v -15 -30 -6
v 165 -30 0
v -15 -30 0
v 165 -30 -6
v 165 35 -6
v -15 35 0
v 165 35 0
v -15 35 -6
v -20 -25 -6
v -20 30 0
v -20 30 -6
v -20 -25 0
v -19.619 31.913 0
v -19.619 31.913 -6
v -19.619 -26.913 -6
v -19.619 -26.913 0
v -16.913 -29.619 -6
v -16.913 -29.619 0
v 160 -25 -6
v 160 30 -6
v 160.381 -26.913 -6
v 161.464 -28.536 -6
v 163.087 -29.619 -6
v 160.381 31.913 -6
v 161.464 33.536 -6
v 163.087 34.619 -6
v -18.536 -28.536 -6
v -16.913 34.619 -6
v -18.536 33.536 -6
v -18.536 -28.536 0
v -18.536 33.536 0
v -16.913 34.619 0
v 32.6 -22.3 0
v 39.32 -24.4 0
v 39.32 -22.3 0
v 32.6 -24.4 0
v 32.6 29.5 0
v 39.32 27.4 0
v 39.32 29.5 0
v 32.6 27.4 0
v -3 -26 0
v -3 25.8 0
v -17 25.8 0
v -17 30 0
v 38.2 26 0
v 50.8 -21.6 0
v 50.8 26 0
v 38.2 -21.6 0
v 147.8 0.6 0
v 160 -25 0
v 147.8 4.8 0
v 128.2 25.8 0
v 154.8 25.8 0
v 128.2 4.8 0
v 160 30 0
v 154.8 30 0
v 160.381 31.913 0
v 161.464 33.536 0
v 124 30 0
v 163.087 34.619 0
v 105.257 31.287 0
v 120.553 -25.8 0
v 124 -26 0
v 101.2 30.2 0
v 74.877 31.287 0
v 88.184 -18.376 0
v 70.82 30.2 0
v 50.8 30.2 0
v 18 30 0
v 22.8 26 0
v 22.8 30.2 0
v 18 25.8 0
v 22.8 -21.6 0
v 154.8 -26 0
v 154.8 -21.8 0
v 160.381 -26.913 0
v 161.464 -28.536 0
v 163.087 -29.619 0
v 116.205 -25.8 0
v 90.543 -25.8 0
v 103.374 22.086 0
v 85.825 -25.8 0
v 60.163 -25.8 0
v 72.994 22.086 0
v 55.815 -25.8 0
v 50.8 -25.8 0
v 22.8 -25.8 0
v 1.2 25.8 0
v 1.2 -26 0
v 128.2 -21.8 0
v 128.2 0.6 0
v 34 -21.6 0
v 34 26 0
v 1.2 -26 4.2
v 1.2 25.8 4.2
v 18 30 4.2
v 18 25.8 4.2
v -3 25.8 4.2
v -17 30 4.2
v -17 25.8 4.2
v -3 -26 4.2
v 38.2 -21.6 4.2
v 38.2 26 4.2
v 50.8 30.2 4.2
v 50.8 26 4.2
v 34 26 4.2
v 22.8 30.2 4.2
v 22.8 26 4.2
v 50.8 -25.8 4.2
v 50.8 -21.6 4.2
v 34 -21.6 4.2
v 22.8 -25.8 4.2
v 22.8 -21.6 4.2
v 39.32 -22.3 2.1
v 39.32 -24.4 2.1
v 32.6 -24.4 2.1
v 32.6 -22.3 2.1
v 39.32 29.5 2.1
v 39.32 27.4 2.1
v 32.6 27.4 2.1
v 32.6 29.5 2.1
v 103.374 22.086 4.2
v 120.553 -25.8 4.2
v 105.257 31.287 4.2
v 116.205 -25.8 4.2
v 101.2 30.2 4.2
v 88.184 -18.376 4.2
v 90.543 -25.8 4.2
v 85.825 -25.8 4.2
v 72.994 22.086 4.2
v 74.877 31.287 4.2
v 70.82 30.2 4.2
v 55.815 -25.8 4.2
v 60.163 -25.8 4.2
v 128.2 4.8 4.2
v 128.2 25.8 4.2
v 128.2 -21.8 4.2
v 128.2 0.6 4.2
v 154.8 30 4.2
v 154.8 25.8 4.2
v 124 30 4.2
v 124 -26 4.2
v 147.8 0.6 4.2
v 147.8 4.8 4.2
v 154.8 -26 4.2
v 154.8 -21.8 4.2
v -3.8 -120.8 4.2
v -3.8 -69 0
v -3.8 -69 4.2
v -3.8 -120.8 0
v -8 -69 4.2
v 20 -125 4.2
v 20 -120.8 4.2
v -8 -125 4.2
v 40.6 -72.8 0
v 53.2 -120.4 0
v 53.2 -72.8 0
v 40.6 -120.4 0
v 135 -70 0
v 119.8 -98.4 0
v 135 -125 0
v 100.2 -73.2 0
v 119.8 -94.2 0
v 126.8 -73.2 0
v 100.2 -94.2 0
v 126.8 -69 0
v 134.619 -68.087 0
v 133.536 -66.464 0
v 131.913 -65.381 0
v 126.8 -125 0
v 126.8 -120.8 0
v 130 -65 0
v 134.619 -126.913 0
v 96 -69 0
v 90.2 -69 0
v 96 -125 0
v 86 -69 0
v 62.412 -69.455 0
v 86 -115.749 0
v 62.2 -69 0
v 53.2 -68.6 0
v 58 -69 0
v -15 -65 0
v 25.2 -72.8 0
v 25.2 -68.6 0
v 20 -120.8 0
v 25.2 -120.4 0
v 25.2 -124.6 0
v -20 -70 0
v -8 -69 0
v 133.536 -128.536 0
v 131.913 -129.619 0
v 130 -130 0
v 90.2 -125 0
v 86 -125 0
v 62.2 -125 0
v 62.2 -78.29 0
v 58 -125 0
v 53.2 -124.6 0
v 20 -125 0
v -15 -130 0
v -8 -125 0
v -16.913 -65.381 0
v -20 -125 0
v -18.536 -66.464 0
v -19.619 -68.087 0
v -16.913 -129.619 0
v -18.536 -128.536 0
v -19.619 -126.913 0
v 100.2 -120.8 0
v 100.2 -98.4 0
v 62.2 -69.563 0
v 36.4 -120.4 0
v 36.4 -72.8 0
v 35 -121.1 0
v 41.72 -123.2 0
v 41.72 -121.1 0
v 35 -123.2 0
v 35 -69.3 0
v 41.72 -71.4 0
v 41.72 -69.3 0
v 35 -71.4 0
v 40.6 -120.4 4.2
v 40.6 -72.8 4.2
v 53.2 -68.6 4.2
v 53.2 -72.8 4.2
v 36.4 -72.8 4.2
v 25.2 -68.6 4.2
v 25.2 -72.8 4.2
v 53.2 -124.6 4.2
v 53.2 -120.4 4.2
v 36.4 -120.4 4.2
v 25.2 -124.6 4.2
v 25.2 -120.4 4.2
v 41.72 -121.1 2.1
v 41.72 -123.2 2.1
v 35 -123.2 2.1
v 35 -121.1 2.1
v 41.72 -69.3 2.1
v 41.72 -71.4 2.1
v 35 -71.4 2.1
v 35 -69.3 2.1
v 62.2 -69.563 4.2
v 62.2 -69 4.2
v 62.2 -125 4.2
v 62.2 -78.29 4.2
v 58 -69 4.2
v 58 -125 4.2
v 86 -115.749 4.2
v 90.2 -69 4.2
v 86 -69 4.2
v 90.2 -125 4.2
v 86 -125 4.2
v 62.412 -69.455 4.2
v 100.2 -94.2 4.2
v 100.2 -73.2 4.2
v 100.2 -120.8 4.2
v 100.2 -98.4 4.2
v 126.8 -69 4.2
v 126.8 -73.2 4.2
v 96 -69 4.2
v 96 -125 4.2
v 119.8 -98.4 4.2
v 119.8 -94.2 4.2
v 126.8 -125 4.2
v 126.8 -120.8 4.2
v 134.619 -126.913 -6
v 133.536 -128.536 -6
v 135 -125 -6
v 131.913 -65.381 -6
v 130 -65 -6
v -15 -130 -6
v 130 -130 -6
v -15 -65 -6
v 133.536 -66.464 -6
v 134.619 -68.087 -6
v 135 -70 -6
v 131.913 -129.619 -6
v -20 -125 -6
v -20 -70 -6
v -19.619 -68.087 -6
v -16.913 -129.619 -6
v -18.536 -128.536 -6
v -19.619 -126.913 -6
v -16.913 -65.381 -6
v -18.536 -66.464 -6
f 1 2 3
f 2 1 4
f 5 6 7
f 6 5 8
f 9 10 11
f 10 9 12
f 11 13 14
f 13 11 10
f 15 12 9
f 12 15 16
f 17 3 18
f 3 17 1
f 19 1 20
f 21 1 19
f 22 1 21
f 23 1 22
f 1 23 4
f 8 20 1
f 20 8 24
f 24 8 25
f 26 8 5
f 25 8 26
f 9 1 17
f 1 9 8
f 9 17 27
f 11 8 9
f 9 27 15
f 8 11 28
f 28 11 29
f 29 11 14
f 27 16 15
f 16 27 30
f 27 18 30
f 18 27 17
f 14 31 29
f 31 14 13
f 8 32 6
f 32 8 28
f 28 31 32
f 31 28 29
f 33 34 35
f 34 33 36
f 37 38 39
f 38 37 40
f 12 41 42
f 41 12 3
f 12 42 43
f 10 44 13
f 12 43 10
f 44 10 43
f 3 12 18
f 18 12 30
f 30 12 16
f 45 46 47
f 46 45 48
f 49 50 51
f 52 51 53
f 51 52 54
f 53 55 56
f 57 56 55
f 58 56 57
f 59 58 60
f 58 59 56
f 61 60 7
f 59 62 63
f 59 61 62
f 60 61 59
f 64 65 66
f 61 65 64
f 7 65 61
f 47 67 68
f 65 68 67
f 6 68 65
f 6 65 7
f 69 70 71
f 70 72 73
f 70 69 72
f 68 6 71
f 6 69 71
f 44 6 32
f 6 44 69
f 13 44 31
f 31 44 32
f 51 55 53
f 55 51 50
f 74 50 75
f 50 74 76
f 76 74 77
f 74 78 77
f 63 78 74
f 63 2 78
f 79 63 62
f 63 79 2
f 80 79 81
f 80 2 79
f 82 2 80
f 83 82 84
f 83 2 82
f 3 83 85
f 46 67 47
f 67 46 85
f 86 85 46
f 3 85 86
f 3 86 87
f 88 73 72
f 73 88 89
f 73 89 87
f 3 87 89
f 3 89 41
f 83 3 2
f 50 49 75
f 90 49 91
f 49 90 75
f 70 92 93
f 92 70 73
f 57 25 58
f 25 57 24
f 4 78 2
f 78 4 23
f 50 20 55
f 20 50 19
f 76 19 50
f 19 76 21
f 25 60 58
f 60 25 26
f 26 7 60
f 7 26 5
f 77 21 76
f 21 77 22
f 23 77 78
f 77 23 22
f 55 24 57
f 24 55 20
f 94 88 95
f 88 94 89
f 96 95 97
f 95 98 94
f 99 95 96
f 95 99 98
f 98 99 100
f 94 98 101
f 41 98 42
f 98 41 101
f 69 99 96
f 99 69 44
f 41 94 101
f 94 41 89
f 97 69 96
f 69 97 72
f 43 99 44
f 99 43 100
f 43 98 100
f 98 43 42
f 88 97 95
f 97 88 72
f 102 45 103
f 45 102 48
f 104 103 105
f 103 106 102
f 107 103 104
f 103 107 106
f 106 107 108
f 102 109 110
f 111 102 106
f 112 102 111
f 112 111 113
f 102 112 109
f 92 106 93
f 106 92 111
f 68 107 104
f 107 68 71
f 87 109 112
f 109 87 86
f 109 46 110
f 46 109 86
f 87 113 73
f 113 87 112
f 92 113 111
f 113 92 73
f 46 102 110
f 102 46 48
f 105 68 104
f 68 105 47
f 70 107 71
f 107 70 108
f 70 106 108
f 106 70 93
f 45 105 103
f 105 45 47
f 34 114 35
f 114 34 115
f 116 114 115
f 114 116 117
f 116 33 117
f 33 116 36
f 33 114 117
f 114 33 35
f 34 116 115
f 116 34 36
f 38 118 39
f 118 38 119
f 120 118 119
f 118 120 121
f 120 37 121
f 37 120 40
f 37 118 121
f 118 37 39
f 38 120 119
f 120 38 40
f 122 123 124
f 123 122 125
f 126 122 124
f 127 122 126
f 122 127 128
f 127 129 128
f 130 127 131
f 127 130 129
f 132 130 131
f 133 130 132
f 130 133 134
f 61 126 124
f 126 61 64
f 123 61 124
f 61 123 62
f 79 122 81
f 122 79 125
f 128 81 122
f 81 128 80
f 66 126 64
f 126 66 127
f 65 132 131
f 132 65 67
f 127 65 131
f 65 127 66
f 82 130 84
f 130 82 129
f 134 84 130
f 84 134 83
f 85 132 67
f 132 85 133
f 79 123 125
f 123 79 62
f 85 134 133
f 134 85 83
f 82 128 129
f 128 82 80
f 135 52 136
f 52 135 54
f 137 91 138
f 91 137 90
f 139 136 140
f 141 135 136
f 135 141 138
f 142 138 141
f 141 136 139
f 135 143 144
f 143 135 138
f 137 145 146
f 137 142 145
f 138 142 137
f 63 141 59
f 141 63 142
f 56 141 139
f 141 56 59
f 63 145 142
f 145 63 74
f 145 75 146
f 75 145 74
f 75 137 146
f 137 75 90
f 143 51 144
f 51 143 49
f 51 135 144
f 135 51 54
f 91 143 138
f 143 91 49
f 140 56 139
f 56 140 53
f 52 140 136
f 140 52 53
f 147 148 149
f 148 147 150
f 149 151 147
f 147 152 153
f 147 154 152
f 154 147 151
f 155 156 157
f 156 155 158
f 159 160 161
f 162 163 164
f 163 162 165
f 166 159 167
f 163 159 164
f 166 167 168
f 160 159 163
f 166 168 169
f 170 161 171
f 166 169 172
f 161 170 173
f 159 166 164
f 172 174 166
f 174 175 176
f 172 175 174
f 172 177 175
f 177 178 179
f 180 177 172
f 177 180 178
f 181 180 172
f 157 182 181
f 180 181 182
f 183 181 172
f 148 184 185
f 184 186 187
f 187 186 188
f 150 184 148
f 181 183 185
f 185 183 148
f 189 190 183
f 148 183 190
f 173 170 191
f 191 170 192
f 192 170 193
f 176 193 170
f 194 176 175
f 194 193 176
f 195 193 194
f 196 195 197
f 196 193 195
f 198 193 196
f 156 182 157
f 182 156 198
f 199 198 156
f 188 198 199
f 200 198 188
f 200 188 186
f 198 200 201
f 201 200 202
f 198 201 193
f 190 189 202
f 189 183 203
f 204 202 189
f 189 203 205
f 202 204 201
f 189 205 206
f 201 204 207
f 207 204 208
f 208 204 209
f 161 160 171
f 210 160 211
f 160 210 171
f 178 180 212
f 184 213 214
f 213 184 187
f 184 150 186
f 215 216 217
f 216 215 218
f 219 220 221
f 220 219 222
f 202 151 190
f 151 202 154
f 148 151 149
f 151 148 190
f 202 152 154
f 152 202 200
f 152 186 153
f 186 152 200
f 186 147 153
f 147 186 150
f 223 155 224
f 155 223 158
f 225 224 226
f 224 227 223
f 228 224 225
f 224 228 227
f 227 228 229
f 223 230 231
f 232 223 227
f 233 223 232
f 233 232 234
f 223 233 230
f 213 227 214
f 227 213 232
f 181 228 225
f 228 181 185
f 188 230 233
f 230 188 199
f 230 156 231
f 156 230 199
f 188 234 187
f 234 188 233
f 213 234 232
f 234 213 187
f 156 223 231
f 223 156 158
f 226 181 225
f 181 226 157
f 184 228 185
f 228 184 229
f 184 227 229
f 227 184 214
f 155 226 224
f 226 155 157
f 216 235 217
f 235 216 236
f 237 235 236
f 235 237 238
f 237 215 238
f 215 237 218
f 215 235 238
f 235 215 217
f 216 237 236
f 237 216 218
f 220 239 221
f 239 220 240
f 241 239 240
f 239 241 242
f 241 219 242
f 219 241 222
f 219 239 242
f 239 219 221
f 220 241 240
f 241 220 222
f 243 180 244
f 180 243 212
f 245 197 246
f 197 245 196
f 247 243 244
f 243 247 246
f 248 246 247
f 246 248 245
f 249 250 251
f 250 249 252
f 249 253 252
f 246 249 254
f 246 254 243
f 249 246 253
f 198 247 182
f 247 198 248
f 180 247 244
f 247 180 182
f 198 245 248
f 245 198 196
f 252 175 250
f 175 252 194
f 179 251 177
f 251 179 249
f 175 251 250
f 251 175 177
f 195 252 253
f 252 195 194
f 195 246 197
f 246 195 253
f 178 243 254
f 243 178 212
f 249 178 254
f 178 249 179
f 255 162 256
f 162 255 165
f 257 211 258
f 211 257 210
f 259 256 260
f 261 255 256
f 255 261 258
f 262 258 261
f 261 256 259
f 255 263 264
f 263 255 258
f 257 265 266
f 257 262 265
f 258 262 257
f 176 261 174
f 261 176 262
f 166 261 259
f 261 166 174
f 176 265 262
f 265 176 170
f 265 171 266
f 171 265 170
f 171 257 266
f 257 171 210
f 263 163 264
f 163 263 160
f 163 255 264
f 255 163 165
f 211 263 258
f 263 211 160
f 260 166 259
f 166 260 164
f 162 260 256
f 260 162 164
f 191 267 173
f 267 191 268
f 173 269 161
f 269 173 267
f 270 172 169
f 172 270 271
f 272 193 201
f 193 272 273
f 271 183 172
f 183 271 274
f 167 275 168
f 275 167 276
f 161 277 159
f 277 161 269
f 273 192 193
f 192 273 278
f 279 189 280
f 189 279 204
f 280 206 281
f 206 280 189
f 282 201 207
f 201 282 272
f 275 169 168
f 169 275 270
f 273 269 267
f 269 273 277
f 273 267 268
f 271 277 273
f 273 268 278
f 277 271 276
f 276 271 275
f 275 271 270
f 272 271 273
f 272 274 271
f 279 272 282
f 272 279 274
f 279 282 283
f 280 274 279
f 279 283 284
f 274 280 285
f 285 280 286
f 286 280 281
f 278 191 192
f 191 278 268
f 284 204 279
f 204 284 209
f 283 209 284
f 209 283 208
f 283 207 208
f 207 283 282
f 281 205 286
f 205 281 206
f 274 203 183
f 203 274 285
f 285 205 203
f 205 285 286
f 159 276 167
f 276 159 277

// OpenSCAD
//Основа 1
difference(){
translate([-15,-25,-6]){
minkowski(){
cube([180,55,3]);
cylinder(3,5,5);
}
}
translate([165,-25,-8]){
minkowski(){
cube([180,55,6]);
cylinder(3,5,5);
}
}
}

color([0,0,0]){
//Time
translate([20,5,0])
union(){
//T
translate([-23,-31,0])
scale(1.4){  
union(){ 
  cube([3,40,3]);
   translate([-10,37,0]) cube([25,3,3]);
}
}


//I
scale(1.4){
translate([10,-22,0])
difference(){
union(){ 
 cube([3,40,3]);
  translate([-8,0,0]) cube([20,3,3]);
  translate([-8,37,0]) cube([20,3,3]);
}
translate([-1,1,0]) cube([4.8,1.5,1.5]);
translate([-1,38,0]) cube([4.8,1.5,1.5]);
}
}

//M
scale(1.4){ 
translate([74,18,0]) 
rotate([0,0,-90])
difference(){
union(){
  translate([0,-16,0]) rotate([0,0,15]) cube([43,3,3]);
  translate([0,-16,0]) rotate([0,0,-15]) cube([43,3,3]);

 translate([0,-37.7,0]) rotate([0,0,15]) cube([43,3,3]);

 translate([0,-37.7,0])
  rotate([0,0,-15]) cube([43,3,3]);
}
 translate([40,-60,0]) cube([5,60,6]);
}
}
//E
translate([104,-31,0])
 scale(1.4){
   union(){ 
    cube([3,40,3]);
    cube([22,3,3]);
     translate([0,19,0]) cube([17,3,3]);
     translate([0,37,0]) cube([22,3,3]);
}
}
}
}


//Основа 2
translate([-15,-125,-6]){
minkowski(){
cube([145,55,3]);
cylinder(3,5,5);
}
}


//Line
color([0,0,0]){
//L
translate([-8,-125,0])
scale(1.4){
union(){ 
 cube([3,40,3]);
 cube([20,3,3]);
}
}

//I
scale(1.4){
translate([26,-89,0])
difference(){
union(){ 
 cube([3,40,3]);
  translate([-8,0,0]) cube([20,3,3]);
  translate([-8,37,0]) cube([20,3,3]);
}
translate([-1,1,0]) cube([4.8,1.5,1.5]);
translate([-1,38,0]) cube([4.8,1.5,1.5]);
}
}

//N
translate([58,-125,0])
scale(1.4){
union(){
 cube([3,40,3]);
 translate([20,0,0,]) cube([3,40,3]);
 translate([20,0,0]) rotate([0,0,27]) cube([3,43,3]);
}
}

//E
translate([96,-125,0])
 scale(1.4){
   union(){ 
    cube([3,40,3]);
    cube([22,3,3]);
     translate([0,19,0]) cube([17,3,3]);
     translate([0,37,0]) cube([22,3,3]);
}
}
}
